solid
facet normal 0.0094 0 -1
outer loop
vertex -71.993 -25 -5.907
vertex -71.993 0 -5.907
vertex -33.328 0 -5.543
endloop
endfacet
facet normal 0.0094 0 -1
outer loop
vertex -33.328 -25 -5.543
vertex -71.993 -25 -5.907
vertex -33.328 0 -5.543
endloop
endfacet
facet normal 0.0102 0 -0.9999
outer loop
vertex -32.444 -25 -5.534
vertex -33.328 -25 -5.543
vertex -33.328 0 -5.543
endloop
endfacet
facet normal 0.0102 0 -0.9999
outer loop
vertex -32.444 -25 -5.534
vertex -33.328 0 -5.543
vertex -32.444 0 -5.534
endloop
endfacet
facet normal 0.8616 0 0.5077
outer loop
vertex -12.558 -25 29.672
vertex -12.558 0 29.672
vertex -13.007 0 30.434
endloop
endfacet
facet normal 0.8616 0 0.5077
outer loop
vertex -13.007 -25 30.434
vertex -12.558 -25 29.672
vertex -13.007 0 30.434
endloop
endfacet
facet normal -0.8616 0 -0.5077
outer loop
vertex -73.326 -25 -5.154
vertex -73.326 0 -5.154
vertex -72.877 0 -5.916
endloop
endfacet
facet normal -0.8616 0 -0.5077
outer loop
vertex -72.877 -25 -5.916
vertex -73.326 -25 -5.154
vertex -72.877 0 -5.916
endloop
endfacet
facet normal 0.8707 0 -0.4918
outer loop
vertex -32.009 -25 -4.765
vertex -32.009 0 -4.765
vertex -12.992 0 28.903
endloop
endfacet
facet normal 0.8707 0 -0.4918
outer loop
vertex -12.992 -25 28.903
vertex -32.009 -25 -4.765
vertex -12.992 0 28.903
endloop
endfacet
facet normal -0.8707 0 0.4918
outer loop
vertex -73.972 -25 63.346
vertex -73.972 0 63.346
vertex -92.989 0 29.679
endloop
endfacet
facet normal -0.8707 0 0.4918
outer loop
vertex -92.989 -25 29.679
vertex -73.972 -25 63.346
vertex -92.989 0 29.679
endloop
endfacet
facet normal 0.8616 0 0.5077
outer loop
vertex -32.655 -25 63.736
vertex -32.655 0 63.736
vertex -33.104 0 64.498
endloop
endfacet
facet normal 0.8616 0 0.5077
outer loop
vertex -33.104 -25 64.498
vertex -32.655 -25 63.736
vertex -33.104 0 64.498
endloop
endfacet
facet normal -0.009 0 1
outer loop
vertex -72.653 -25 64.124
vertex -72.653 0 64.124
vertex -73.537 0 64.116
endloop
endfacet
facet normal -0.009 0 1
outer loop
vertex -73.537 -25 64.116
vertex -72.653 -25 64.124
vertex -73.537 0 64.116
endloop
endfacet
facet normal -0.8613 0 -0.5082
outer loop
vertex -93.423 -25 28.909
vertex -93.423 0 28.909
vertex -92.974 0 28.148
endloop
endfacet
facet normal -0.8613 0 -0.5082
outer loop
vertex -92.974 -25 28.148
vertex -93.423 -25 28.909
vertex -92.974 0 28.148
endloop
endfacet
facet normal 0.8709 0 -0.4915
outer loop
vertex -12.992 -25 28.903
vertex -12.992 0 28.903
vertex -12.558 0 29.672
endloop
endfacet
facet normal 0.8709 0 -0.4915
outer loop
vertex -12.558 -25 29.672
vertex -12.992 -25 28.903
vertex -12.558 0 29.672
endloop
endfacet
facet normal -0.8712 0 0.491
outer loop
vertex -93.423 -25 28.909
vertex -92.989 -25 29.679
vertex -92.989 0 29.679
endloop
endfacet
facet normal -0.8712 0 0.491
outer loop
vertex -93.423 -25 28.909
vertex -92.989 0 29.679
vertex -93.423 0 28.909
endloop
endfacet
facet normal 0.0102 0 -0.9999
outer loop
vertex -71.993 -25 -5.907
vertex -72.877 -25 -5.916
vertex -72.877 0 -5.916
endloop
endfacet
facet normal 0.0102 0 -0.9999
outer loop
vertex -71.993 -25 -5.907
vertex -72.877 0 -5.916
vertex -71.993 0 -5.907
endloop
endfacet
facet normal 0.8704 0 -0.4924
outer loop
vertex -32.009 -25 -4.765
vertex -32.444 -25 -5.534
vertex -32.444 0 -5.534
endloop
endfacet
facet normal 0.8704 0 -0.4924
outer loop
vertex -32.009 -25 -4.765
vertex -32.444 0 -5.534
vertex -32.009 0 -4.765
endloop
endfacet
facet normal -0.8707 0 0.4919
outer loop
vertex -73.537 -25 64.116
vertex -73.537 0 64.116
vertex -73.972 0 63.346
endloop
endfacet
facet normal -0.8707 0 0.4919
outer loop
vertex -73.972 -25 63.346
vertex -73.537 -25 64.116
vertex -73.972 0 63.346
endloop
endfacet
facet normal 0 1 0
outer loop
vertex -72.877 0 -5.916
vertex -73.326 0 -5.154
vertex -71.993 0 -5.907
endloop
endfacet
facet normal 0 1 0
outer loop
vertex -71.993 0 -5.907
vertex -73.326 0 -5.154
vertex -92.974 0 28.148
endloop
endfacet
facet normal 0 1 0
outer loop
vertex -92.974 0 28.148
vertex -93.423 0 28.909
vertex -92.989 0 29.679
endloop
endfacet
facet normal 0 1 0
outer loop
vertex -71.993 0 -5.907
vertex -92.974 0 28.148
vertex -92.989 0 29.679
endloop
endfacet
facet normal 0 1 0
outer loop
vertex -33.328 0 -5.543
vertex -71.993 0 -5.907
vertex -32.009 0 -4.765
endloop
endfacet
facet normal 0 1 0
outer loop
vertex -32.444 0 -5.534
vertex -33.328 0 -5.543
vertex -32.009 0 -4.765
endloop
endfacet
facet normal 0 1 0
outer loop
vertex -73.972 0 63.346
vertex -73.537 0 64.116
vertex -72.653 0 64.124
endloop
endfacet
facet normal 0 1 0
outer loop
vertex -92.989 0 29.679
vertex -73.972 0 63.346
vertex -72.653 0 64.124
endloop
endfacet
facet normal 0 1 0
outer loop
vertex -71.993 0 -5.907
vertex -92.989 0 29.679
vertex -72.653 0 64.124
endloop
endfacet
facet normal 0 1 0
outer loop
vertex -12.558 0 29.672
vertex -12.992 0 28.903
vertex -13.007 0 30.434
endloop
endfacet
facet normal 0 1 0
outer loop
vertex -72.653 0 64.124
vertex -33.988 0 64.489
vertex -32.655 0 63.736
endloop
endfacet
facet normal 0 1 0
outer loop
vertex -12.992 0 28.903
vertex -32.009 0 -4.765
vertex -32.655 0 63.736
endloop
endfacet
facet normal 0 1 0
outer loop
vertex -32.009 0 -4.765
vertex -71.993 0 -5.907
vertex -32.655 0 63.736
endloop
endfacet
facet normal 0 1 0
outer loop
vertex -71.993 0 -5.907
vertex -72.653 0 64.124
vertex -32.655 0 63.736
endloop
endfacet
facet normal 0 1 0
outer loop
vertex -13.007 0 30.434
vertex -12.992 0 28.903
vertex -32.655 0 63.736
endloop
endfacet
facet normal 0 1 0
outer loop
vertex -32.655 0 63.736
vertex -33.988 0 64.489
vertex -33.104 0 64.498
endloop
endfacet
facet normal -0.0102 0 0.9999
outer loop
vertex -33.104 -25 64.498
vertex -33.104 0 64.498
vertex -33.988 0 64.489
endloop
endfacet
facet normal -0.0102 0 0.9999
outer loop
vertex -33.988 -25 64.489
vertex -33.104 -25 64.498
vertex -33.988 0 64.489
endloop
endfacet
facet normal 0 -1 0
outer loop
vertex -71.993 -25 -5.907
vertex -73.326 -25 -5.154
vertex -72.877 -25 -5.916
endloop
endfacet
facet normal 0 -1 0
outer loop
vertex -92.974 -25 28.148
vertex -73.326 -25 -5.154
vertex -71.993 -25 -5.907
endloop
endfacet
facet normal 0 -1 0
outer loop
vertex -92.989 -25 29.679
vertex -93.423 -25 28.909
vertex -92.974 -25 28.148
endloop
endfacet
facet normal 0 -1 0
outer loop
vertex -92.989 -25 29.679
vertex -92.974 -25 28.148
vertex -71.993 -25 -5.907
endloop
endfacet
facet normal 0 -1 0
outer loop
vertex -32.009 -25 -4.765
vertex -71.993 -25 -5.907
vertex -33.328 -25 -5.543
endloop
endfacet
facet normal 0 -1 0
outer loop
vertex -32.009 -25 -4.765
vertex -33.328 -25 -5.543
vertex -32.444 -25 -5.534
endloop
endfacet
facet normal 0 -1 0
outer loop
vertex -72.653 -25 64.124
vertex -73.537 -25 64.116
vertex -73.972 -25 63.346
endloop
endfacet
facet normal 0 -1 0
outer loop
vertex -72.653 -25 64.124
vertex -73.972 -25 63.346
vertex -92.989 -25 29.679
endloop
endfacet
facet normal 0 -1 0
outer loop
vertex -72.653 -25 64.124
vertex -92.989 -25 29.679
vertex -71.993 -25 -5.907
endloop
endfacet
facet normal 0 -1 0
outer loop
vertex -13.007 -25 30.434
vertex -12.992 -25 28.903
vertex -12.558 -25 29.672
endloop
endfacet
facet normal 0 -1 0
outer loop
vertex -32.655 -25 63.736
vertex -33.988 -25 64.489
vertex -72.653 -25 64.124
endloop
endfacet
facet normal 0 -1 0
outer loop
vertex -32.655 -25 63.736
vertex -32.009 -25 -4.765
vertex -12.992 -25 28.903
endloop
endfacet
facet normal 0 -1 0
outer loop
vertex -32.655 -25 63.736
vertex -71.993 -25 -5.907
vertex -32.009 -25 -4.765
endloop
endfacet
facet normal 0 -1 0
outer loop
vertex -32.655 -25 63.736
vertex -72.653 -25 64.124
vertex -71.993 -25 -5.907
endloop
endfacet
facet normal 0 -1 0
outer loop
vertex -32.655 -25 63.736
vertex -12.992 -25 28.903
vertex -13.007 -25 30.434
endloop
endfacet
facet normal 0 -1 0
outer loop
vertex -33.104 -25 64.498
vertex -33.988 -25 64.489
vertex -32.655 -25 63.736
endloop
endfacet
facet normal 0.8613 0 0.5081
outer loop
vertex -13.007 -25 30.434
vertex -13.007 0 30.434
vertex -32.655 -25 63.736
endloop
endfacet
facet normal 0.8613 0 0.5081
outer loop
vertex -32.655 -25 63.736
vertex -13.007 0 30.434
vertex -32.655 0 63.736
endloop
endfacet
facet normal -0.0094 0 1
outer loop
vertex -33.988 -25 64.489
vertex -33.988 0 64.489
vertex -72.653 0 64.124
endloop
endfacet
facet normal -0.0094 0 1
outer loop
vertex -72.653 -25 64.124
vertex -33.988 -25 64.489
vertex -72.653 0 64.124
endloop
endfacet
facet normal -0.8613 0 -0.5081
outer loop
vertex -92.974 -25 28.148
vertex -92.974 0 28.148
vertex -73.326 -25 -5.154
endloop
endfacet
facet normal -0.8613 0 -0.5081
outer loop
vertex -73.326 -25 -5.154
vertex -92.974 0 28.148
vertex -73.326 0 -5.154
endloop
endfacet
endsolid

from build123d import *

# Parameters (mm, degrees)
F1_DEPTH = 25


with BuildPart() as f1:
    # F0 (on Front) → F1 (new body)
    with BuildSketch(Plane.XZ):
        with BuildLine():
            ThreePointArc((-12.9923656989, 28.902602186), (-12.9909523706, 29.0967337225), (-12.9904812574, 29.290869832))
            ThreePointArc((-12.9904812574, 29.290869832), (-12.9945641617, 29.8623728238), (-13.0068120409, 30.4337591459))
            Line((-13.0068120409, 30.4337591459), (-32.6551738333, 63.7361201862))
            ThreePointArc((-32.6551738333, 63.7361201862), (-33.3181920134, 64.1190342382), (-33.9884178287, 64.489187767))
            Line((-33.9884178287, 64.489187767), (-72.6532893918, 64.1243878322))
            ThreePointArc((-72.6532893918, 64.1243878322), (-73.3164117783, 63.741654271), (-73.9720870452, 63.3462984531))
            Line((-73.9720870452, 63.3462984531), (-92.988596816, 29.679137478))
            ThreePointArc((-92.988596816, 29.679137478), (-92.9887010223, 28.9134898649), (-92.974150474, 28.1479805181))
            Line((-92.974150474, 28.1479805181), (-73.3257886816, -5.1543805222))
            ThreePointArc((-73.3257886816, -5.1543805222), (-72.6627705014, -5.5372945741), (-71.9925446861, -5.9074481029))
            Line((-71.9925446861, -5.9074481029), (-33.3276731231, -5.5426481682))
            ThreePointArc((-33.3276731231, -5.5426481682), (-32.6645507366, -5.1599146069), (-32.0088754696, -4.764558789))
            Line((-32.0088754696, -4.764558789), (-12.9923656989, 28.902602186))
        make_face()
        with BuildLine():
            ThreePointArc((-13.0068120409, 30.4337591459), (-12.9945641617, 29.8623728238), (-12.9904812574, 29.290869832))
            ThreePointArc((-12.9904812574, 29.290869832), (-12.9909523706, 29.0967337225), (-12.9923656989, 28.902602186))
            Line((-12.9923656989, 28.902602186), (-12.5575819284, 29.6723509657))
            Line((-12.5575819284, 29.6723509657), (-13.0068120409, 30.4337591459))
        make_face()
        with BuildLine():
            ThreePointArc((-33.9884178287, 64.489187767), (-33.3181920134, 64.1190342382), (-32.6551738333, 63.7361201862))
            Line((-32.6551738333, 63.7361201862), (-33.1044039458, 64.4975283665))
            Line((-33.1044039458, 64.4975283665), (-33.9884178287, 64.489187767))
        make_face()
        with BuildLine():
            Line((-32.4436592401, -5.5343075687), (-32.0088754696, -4.764558789))
            ThreePointArc((-32.0088754696, -4.764558789), (-32.6645507366, -5.1599146069), (-33.3276731231, -5.5426481682))
            Line((-33.3276731231, -5.5426481682), (-32.4436592401, -5.5343075687))
        make_face()
        with BuildLine():
            ThreePointArc((-73.9720870452, 63.3462984531), (-73.3164117783, 63.741654271), (-72.6532893918, 64.1243878322))
            Line((-72.6532893918, 64.1243878322), (-73.5373032748, 64.1160472328))
            Line((-73.5373032748, 64.1160472328), (-73.9720870452, 63.3462984531))
        make_face()
        with BuildLine():
            Line((-72.8765585691, -5.9157887024), (-71.9925446861, -5.9074481029))
            ThreePointArc((-71.9925446861, -5.9074481029), (-72.6627705014, -5.5372945741), (-73.3257886816, -5.1543805222))
            Line((-73.3257886816, -5.1543805222), (-72.8765585691, -5.9157887024))
        make_face()
        with BuildLine():
            ThreePointArc((-92.974150474, 28.1479805181), (-92.9887010223, 28.9134898649), (-92.988596816, 29.679137478))
            Line((-92.988596816, 29.679137478), (-93.4233805865, 28.9093886984))
            Line((-93.4233805865, 28.9093886984), (-92.974150474, 28.1479805181))
        make_face()
    extrude(amount=F1_DEPTH)


solid = f1.part
